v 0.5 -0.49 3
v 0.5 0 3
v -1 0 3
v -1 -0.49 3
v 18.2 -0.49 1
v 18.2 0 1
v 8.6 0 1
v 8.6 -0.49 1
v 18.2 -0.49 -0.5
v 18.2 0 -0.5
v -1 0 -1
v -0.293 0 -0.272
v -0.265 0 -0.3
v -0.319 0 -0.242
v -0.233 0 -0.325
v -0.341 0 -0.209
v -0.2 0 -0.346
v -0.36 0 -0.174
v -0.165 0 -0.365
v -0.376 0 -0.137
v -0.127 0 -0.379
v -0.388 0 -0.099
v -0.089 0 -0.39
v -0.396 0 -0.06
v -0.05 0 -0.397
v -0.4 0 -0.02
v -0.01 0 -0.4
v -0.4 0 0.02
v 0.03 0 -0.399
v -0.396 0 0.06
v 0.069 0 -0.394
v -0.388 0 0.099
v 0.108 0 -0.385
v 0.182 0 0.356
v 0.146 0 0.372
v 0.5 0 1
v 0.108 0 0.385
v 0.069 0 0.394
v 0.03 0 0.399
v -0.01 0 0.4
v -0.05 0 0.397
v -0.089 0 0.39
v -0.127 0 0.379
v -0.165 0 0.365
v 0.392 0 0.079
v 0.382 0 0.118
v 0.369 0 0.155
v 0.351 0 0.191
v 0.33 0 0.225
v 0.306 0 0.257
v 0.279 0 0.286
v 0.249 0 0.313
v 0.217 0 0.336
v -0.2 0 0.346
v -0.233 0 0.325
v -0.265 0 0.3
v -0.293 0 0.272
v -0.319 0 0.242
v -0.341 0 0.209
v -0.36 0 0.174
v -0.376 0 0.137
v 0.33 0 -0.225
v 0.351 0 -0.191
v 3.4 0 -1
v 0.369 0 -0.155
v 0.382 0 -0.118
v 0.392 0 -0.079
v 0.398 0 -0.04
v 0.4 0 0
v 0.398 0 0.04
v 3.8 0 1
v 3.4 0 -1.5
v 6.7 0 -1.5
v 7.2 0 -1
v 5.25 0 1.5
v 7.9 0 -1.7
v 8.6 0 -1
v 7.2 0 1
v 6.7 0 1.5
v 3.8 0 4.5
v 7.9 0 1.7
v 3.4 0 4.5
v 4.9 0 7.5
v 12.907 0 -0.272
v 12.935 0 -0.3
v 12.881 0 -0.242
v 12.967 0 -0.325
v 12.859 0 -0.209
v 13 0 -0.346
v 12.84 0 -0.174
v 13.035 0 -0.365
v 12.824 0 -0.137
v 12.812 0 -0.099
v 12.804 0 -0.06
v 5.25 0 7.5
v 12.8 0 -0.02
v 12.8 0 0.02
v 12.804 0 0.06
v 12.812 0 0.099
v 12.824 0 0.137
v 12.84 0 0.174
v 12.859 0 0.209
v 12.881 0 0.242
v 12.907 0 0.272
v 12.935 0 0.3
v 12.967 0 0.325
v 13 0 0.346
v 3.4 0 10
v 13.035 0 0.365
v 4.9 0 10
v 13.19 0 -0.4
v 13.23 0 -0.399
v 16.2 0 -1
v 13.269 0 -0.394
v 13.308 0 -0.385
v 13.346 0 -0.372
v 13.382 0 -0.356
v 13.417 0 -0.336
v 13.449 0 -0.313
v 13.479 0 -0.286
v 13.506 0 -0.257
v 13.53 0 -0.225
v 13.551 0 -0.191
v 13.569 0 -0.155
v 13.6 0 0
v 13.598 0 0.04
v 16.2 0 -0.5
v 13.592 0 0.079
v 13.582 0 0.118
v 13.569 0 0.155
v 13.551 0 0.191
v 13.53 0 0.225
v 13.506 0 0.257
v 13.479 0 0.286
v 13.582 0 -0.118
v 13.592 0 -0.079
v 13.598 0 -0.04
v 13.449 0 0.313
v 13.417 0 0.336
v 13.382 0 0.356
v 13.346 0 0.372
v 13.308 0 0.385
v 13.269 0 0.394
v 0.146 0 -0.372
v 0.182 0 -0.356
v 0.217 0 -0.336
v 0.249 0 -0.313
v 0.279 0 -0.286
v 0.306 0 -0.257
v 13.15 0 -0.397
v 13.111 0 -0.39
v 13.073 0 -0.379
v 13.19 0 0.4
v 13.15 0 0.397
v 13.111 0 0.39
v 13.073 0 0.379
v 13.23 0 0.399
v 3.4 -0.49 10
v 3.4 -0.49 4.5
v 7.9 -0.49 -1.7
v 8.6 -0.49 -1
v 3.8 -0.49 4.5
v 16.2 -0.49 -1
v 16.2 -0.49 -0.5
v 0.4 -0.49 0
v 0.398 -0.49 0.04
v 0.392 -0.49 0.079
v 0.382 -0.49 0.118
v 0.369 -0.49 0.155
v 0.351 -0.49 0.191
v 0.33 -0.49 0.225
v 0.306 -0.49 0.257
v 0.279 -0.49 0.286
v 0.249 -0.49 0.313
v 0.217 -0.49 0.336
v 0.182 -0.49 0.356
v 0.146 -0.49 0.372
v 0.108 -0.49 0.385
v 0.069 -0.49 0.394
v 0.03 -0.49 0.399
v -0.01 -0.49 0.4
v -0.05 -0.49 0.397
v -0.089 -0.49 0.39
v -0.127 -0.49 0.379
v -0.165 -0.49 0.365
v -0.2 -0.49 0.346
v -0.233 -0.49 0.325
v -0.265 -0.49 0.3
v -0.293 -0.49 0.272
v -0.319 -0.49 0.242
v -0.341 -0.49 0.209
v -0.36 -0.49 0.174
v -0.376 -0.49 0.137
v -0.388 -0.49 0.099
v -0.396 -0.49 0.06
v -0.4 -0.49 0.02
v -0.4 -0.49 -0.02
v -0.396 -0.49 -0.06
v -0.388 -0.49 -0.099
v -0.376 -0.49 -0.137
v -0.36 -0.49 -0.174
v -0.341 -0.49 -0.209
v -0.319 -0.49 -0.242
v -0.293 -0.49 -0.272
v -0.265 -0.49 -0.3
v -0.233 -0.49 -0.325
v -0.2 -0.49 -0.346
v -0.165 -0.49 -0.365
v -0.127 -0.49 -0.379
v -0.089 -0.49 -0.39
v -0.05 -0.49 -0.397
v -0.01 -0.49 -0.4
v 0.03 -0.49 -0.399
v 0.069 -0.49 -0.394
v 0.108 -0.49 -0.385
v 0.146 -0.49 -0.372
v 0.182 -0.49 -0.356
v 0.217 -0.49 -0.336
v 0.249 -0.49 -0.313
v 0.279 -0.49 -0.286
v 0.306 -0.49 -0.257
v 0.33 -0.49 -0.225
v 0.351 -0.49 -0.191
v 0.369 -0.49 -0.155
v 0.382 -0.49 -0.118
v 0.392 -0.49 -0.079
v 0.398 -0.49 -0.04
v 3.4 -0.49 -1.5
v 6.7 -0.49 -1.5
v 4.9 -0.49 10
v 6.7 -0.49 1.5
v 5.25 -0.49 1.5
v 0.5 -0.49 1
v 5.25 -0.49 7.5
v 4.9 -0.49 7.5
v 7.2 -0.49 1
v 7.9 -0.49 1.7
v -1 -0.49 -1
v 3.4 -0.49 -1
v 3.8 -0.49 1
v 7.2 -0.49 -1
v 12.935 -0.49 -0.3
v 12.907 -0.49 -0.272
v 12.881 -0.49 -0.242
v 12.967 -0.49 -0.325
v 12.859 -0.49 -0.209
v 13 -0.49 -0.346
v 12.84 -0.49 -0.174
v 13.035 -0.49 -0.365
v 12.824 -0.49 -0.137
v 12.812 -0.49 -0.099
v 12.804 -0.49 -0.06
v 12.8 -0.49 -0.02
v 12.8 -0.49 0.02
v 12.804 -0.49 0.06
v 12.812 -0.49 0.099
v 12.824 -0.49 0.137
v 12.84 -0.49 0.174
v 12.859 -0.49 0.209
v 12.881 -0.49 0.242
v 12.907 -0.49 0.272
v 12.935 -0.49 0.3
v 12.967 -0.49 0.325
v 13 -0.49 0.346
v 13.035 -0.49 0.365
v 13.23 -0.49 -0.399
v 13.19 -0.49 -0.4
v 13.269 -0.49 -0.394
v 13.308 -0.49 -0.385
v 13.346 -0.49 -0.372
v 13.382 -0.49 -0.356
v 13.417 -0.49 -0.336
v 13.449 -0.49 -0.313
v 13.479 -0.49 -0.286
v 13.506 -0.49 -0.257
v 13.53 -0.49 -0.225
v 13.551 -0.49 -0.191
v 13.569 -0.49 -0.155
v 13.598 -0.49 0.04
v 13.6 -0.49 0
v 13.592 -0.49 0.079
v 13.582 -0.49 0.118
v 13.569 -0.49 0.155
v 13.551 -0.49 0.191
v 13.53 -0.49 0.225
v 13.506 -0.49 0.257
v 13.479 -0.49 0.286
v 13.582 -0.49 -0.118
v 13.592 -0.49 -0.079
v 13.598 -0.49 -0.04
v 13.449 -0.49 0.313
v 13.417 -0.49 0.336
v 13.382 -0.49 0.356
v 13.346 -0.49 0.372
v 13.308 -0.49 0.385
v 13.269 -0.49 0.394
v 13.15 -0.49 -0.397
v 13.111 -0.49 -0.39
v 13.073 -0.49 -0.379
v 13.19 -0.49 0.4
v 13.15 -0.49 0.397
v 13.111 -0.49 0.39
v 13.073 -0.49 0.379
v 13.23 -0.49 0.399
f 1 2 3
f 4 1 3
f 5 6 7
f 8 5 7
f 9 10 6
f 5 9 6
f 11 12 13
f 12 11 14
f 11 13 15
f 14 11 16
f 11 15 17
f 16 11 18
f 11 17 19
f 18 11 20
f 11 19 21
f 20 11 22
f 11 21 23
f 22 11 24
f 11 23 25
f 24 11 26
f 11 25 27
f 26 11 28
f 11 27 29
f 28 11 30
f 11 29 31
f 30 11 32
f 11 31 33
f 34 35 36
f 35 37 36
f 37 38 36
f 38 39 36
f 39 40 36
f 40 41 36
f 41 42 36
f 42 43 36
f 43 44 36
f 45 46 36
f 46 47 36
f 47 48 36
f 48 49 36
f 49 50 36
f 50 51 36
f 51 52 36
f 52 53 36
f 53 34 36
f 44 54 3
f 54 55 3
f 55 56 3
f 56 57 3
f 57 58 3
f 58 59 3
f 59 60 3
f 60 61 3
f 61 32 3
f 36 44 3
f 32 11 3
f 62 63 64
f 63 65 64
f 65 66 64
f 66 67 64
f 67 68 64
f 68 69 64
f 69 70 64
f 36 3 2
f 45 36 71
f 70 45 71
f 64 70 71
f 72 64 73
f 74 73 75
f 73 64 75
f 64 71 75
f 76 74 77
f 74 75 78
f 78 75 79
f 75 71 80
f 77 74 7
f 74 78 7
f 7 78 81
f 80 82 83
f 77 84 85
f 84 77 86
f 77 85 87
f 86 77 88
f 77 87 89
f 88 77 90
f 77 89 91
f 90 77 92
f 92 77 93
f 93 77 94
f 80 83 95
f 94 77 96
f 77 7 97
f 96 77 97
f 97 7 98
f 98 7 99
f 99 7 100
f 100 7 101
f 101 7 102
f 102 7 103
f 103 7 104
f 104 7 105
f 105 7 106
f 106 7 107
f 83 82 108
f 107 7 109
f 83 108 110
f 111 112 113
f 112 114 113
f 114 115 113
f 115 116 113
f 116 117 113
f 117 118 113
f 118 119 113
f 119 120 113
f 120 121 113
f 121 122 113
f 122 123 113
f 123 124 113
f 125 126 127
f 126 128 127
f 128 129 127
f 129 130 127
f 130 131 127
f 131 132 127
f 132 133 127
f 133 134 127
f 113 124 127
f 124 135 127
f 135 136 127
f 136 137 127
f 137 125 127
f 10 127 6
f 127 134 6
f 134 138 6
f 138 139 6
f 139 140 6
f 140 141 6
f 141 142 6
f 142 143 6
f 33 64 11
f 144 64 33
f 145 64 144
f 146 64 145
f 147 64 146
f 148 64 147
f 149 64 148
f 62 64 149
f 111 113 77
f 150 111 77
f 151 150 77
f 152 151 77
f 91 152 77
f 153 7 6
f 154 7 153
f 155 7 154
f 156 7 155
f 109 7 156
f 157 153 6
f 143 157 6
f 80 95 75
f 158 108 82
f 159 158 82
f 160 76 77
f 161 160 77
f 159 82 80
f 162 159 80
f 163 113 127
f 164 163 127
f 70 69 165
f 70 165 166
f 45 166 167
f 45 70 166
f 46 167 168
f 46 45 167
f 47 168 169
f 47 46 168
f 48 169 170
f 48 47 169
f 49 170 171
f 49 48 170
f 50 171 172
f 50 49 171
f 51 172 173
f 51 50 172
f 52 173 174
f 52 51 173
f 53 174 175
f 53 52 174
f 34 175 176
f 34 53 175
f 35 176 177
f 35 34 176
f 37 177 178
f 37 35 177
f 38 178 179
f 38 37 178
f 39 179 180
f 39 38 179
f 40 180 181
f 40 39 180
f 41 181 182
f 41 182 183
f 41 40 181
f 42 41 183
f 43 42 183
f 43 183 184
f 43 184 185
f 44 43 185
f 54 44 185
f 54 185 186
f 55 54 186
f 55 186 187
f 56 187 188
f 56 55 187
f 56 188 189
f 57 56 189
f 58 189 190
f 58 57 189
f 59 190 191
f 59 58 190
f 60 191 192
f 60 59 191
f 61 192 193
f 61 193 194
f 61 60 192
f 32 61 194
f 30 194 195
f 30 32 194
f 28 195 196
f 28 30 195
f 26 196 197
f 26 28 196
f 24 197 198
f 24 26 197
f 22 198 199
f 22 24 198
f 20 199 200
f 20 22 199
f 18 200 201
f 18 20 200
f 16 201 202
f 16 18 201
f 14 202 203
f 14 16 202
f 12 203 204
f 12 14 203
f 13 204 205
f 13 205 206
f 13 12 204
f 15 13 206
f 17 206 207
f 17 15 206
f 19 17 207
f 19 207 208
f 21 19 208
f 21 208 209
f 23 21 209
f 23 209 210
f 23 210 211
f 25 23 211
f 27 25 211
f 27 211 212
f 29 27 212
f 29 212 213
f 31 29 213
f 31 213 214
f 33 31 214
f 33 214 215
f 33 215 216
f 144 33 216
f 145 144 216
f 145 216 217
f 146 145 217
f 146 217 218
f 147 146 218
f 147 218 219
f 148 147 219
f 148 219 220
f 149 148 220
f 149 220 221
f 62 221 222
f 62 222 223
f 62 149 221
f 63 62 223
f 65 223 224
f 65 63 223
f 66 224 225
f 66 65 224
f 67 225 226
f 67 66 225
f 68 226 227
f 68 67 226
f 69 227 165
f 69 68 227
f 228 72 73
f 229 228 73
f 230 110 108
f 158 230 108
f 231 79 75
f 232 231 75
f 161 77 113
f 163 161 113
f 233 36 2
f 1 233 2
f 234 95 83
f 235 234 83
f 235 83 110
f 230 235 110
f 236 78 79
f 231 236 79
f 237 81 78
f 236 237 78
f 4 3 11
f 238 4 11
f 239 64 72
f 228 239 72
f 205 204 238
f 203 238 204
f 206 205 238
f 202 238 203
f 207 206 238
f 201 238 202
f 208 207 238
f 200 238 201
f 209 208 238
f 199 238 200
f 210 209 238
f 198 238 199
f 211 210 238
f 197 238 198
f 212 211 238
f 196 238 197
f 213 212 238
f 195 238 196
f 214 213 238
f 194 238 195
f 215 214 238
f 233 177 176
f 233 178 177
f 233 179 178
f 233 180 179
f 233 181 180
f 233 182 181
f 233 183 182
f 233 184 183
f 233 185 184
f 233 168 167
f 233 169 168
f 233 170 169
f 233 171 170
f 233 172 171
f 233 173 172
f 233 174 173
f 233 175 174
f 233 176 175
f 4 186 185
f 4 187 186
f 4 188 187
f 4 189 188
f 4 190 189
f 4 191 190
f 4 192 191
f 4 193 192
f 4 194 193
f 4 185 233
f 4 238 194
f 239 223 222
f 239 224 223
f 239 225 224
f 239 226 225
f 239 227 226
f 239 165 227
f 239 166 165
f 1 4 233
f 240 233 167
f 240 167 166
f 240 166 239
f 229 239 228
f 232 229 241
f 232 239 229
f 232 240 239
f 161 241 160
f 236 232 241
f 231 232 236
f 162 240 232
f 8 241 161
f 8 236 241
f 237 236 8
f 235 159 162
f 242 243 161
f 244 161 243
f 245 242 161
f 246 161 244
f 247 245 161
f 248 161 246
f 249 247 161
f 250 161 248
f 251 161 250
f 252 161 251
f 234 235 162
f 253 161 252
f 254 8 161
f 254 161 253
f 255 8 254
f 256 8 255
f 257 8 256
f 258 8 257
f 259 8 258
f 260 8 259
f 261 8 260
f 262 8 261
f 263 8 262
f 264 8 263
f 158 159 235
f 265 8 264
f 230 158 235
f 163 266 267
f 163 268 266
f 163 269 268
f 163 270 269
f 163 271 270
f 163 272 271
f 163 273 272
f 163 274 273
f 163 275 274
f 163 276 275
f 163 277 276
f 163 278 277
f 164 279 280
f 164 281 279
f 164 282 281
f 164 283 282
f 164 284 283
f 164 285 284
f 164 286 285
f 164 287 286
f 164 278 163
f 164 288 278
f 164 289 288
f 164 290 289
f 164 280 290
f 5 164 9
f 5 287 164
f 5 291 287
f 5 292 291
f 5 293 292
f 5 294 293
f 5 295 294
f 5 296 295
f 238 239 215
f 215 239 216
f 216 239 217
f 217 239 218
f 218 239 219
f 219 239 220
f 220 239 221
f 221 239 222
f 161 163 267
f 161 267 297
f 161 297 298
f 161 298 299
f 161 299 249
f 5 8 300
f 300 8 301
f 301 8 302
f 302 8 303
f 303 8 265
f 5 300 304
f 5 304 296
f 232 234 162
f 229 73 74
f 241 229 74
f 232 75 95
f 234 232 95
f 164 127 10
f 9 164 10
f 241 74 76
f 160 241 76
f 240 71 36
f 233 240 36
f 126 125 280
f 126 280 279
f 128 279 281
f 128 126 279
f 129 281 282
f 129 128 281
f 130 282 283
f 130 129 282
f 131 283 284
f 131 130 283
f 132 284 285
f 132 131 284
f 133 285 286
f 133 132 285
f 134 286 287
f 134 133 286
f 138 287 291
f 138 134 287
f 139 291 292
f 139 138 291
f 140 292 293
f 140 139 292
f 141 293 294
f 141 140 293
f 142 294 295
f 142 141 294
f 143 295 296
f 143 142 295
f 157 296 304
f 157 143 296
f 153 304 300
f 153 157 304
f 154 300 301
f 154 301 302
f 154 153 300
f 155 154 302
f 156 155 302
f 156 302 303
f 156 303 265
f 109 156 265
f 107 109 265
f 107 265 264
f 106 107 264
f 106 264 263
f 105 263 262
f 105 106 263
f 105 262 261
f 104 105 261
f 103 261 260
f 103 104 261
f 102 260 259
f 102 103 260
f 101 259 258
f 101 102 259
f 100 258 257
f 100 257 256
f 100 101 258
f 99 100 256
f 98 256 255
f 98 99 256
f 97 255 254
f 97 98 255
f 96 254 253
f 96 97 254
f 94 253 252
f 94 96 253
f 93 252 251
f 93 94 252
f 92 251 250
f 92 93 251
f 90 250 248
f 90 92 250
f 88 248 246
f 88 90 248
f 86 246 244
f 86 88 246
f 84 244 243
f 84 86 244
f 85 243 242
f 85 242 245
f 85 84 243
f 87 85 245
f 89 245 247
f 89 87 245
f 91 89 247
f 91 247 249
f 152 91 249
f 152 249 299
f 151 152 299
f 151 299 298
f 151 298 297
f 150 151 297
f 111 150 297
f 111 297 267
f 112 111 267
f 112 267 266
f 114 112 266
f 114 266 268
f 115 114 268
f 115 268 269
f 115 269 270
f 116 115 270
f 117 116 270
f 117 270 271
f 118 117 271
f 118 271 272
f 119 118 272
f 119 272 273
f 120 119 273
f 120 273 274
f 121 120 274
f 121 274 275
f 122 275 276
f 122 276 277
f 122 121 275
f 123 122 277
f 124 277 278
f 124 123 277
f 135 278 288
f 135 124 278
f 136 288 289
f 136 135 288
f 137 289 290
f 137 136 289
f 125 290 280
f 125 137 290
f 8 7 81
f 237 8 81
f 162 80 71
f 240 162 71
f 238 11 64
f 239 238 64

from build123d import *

# Parameters (mm, degrees)
F0_R     = 0.4
F1_DEPTH = 0.49


with BuildPart() as f1:
    # F0 (on Front) → F1 (new body)
    with BuildSketch(Plane.XZ):
        Polygon((0.5, 3), (-1, 3), (-1, -1), (3.4, -1), (3.4, -1.5), (6.7, -1.5), (7.2, -1), (7.9, -1.7), (8.6, -1), (16.2, -1), (16.2, -0.5), (18.2, -0.5), (18.2, 1), (8.6, 1), (7.9, 1.7), (7.2, 1), (6.7, 1.5), (5.25, 1.5), (5.25, 7.5), (4.9, 7.5), (4.9, 10), (3.4, 10), (3.4, 4.5), (3.8, 4.5), (3.8, 1), (0.5, 1), align=None)
        Circle(F0_R, mode=Mode.SUBTRACT)
        with Locations((13.2, 0)):
            Circle(F0_R, mode=Mode.SUBTRACT)
    extrude(amount=F1_DEPTH)


solid = f1.part
